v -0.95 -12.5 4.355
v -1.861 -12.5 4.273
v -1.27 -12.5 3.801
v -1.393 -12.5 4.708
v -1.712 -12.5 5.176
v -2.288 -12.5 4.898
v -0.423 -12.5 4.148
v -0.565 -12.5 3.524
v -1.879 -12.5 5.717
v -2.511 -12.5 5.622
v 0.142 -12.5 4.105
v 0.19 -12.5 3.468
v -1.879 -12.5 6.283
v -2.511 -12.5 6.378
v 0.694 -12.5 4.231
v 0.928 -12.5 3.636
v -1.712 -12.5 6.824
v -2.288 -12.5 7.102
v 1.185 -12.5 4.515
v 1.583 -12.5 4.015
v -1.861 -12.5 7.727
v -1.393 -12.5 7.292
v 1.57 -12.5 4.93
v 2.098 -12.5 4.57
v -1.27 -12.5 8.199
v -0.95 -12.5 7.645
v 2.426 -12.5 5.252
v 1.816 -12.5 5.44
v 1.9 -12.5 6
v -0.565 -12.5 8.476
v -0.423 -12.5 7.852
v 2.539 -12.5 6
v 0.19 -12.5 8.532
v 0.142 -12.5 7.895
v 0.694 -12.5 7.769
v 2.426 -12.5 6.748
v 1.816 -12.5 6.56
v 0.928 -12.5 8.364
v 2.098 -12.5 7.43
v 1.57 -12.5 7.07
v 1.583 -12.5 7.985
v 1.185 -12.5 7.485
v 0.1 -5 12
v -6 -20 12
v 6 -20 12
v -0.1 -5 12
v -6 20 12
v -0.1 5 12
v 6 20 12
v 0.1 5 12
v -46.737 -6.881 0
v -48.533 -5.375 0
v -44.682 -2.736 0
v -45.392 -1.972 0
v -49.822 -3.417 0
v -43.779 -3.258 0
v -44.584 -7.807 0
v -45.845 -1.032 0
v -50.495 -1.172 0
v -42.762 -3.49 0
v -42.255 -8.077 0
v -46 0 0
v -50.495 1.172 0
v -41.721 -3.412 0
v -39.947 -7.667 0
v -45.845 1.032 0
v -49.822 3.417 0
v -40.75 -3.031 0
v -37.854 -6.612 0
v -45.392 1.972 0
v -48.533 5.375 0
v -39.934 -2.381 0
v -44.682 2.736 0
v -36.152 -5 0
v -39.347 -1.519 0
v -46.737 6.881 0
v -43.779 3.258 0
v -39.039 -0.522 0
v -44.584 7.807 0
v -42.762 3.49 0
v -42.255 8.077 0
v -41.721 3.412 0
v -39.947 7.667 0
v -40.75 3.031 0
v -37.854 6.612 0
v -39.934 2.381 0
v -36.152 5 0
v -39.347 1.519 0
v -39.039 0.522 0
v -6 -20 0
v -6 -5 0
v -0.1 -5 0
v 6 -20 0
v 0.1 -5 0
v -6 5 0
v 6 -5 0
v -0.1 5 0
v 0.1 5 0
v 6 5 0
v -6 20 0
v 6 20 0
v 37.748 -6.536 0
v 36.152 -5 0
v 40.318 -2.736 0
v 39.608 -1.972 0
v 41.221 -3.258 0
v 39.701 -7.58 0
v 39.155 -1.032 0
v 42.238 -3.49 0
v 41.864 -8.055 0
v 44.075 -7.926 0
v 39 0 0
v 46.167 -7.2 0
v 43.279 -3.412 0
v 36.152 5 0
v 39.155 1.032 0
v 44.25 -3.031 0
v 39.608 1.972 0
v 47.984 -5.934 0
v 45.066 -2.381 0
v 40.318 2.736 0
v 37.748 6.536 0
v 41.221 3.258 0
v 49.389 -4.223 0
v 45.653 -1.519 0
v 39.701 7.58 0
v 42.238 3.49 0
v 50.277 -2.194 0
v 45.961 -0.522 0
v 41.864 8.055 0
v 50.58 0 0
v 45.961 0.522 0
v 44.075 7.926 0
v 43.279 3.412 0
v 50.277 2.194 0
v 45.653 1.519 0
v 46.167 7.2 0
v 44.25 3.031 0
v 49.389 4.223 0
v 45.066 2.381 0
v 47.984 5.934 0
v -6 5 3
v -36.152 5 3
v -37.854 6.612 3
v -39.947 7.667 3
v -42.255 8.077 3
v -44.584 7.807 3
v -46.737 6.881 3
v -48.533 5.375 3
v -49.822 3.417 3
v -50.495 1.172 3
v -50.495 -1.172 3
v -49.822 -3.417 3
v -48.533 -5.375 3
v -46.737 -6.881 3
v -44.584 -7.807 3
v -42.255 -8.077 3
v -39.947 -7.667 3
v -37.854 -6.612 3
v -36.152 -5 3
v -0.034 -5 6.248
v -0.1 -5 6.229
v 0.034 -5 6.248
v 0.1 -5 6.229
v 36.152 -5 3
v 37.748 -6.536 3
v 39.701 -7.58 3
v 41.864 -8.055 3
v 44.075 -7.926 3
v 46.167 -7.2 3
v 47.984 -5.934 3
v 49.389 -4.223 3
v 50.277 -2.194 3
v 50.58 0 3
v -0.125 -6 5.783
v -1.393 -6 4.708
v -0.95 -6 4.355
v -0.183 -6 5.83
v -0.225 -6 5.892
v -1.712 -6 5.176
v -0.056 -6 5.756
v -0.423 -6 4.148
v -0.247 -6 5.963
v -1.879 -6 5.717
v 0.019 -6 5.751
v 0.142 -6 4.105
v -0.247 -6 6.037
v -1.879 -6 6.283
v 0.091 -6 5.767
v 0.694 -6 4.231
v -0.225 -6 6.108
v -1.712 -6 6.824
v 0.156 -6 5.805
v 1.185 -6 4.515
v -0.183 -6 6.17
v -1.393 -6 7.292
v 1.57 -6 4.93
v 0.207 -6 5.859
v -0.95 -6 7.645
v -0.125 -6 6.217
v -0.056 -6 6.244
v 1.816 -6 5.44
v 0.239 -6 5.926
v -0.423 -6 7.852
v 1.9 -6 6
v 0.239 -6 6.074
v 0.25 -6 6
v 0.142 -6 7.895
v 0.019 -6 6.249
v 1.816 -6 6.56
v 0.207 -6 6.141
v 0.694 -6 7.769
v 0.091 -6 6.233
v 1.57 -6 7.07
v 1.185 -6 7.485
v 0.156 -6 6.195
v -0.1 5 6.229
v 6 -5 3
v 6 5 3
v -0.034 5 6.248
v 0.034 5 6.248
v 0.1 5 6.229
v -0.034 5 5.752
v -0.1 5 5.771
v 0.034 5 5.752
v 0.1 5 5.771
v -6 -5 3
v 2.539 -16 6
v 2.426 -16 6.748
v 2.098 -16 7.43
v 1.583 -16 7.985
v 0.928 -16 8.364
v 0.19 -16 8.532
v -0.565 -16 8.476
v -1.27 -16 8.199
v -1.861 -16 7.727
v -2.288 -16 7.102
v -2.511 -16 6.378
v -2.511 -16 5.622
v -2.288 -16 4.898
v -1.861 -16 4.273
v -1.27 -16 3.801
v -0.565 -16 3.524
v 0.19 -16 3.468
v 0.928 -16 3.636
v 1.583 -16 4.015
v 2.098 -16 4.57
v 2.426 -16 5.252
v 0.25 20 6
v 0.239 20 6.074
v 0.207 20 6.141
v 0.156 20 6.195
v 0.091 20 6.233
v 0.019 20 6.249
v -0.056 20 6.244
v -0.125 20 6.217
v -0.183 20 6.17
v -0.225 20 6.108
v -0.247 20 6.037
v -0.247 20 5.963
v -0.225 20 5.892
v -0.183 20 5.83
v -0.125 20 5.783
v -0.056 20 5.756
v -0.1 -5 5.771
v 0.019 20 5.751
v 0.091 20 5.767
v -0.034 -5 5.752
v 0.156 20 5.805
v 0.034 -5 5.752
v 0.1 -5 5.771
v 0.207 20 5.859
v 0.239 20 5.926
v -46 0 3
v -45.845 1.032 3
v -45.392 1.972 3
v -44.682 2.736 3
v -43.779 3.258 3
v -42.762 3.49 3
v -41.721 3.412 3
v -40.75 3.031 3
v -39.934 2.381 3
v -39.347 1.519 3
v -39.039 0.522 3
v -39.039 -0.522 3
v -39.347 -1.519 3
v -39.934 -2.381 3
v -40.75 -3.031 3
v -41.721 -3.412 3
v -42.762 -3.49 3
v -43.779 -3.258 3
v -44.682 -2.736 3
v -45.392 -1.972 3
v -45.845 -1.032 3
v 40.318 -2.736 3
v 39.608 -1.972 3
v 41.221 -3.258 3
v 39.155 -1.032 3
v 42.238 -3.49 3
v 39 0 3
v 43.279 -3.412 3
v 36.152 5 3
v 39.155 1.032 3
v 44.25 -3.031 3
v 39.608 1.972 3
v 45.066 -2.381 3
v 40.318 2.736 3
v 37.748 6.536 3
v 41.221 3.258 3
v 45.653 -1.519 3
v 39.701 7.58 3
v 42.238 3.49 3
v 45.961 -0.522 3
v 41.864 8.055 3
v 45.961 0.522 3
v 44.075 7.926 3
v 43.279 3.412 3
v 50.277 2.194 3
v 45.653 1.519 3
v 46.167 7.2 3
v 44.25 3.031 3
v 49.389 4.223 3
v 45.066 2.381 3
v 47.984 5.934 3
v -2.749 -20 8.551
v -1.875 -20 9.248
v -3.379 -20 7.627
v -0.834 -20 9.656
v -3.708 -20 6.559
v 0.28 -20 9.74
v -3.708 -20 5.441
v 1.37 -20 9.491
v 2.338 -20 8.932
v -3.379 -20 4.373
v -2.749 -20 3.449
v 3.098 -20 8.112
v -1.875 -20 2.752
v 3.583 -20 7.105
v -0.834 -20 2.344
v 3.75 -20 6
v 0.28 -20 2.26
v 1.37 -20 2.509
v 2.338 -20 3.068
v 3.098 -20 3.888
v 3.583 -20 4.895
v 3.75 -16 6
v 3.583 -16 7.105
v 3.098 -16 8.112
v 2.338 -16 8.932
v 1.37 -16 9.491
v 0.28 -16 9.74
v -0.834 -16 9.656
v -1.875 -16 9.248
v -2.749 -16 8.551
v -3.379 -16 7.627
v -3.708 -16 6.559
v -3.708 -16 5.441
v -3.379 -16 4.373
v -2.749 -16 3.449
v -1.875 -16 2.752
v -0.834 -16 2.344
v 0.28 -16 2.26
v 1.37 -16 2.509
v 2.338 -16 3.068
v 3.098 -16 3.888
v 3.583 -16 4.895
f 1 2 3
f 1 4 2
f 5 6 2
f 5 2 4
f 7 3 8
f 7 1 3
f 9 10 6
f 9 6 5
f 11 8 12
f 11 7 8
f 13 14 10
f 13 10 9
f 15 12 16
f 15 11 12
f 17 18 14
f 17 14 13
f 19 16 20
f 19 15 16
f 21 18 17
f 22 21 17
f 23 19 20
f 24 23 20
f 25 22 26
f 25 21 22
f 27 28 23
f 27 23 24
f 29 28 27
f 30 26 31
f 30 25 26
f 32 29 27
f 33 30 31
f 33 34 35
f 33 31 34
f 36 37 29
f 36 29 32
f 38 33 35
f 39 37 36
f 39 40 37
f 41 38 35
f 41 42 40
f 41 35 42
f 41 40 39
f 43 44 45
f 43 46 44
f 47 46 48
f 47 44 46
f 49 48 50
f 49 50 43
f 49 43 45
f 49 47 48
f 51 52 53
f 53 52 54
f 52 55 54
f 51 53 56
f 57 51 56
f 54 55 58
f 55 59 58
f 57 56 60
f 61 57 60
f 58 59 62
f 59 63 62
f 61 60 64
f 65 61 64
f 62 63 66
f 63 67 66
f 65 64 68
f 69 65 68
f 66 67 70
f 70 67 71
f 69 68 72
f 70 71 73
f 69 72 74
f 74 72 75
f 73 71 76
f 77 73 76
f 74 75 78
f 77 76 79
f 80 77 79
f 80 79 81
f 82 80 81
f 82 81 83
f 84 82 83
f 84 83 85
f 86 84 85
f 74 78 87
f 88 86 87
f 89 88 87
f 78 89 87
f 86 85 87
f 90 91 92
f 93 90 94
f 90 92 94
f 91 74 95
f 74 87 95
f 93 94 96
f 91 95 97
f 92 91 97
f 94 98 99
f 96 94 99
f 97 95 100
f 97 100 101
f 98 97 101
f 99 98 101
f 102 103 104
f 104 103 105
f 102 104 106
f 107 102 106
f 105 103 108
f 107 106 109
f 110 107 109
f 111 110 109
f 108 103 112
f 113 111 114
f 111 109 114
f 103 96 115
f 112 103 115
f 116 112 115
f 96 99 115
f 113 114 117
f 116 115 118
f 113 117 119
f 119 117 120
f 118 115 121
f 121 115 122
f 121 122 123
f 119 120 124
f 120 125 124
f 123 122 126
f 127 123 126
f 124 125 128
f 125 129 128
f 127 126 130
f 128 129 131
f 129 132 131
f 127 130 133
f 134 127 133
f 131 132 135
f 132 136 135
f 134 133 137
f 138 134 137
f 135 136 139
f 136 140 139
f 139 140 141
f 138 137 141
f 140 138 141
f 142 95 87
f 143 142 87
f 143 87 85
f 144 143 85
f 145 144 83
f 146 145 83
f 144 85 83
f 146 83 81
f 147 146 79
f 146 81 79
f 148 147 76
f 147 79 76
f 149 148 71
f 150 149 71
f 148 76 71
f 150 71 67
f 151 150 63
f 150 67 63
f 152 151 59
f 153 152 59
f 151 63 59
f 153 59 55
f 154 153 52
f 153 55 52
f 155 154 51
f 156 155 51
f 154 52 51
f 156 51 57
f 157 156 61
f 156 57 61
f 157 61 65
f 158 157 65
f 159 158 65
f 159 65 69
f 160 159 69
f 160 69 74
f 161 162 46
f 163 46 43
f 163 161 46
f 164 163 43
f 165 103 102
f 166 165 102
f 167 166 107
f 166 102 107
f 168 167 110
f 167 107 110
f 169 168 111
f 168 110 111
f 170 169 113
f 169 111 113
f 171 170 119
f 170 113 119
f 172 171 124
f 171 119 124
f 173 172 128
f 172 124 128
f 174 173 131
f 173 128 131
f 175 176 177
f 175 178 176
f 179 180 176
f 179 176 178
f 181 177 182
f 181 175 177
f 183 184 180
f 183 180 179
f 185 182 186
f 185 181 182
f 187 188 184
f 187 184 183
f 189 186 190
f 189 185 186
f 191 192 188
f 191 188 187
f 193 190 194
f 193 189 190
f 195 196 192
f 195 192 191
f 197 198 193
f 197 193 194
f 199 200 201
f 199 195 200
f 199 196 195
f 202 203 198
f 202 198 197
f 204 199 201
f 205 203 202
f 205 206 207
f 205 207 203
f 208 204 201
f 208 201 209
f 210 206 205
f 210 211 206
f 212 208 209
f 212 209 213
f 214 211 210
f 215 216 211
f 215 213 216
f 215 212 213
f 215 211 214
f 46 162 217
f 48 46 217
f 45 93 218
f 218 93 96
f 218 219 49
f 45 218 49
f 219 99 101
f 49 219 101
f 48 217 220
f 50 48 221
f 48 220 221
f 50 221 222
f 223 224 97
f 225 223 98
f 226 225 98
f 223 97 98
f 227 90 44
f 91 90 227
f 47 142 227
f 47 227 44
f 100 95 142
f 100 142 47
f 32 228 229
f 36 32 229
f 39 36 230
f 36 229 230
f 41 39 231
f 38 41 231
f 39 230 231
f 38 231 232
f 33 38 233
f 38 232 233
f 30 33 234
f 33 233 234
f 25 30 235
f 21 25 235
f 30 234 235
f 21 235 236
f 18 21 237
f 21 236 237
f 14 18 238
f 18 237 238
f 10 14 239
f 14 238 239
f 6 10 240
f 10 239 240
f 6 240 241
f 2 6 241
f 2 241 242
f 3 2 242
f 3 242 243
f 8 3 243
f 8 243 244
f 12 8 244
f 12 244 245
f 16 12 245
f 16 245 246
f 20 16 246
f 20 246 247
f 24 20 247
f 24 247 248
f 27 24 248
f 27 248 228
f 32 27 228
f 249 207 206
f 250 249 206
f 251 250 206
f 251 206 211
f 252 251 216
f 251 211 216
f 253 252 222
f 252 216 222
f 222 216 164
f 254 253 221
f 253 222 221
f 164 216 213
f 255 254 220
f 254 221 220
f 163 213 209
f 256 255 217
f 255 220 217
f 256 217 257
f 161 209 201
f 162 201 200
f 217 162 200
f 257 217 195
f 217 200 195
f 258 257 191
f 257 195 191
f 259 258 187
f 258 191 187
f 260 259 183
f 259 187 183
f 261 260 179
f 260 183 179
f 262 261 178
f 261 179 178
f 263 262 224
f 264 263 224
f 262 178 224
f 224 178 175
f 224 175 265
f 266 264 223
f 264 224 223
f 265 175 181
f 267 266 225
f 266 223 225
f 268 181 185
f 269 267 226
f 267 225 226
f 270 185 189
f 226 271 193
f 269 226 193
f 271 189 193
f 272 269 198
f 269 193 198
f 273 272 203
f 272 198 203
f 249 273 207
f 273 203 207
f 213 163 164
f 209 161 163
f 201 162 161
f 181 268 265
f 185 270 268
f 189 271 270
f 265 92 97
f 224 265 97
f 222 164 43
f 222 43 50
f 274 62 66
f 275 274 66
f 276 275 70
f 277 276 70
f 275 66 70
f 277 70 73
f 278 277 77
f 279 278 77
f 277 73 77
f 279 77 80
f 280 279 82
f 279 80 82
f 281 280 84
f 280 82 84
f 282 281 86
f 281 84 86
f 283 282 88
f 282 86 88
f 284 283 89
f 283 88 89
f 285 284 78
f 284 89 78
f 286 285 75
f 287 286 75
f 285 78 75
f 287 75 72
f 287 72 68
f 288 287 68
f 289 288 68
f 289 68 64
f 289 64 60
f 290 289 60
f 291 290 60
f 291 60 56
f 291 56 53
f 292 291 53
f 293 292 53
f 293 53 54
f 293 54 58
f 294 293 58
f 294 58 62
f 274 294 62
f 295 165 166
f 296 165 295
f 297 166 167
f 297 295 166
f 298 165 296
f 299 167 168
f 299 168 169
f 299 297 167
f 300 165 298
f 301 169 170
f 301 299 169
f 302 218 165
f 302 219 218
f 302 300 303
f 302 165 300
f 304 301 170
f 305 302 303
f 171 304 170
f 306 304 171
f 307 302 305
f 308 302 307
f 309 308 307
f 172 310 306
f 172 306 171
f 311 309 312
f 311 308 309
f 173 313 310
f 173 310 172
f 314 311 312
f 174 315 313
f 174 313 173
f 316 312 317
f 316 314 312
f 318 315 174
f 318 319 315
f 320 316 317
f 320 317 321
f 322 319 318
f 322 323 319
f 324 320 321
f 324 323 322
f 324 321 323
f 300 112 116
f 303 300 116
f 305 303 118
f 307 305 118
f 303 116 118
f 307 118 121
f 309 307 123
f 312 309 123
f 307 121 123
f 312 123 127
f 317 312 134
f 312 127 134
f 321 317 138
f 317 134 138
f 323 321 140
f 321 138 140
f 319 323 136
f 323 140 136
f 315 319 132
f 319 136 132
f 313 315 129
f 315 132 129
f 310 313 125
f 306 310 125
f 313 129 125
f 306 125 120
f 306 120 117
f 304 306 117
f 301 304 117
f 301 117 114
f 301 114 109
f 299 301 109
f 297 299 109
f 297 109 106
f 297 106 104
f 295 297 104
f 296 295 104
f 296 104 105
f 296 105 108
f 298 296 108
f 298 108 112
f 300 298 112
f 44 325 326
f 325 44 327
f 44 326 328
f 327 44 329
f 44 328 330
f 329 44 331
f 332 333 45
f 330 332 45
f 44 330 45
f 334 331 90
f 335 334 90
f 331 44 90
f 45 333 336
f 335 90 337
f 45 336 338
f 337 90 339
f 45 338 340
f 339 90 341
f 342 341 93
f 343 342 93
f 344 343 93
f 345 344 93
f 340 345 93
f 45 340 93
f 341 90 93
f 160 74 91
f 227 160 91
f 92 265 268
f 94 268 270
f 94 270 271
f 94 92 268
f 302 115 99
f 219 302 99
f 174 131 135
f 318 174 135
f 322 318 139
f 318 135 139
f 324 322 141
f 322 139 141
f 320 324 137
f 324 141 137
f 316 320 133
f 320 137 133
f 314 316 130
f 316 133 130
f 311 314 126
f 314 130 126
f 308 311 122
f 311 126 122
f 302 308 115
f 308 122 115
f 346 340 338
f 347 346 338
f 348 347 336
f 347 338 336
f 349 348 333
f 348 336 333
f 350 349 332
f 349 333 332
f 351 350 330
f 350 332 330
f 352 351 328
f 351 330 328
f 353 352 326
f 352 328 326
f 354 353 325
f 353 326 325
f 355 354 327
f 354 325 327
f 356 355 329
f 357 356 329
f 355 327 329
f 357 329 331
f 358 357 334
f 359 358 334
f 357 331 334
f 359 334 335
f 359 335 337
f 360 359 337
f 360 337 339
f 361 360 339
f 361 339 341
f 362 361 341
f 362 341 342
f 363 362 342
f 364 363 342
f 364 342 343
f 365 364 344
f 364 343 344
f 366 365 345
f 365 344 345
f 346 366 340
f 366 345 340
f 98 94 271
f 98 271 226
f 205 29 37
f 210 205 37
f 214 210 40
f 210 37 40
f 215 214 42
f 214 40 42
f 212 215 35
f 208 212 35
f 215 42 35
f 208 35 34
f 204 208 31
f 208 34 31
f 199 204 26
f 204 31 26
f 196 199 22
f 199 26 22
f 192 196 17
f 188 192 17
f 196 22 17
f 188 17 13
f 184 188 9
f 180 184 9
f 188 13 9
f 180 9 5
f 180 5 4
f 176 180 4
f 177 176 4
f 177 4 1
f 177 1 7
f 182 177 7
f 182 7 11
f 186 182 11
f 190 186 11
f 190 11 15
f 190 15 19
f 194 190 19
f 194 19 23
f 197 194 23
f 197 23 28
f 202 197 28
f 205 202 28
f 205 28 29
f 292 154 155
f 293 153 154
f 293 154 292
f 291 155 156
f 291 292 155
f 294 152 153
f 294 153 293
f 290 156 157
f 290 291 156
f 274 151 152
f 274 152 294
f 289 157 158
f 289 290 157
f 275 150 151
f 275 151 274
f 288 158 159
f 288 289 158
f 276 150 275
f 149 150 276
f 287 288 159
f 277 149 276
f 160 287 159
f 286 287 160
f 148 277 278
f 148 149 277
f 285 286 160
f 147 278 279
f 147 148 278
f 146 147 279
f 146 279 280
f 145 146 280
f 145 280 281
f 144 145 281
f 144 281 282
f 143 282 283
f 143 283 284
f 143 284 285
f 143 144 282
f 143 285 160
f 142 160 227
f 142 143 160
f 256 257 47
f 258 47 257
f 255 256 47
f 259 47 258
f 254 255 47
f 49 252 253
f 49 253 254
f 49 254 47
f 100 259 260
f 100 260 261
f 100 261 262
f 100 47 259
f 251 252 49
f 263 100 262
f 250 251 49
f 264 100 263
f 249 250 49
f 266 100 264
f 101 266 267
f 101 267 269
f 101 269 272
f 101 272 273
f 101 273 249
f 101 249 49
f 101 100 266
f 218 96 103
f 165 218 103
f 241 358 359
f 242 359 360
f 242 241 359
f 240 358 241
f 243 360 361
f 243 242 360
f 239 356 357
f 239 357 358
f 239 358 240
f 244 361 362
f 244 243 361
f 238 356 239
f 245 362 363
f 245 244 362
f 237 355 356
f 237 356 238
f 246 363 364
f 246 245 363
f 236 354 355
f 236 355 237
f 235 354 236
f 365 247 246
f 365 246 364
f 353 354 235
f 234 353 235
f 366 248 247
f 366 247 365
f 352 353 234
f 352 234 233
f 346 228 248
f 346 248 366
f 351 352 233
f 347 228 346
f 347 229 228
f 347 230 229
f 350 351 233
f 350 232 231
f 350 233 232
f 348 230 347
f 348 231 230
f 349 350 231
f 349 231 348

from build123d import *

# Parameters (mm, degrees)
F1_DEPTH  = 3
F3_D      = 7
F4_R      = 0.2
F5_DEPTH  = 12.5
F6_W      = 12
F6_H      = 40
F7_DEPTH  = 12
F8_W      = 0.2
F8_H      = 10
F9_DEPTH  = 12
F10_R     = 0.25
F11_DEPTH = 25
F12_R     = 1.9
F13_DEPTH = 14
F14_R     = 2.5392284098
F15_DEPTH = 7.5
F16_R     = 3.75
F17_DEPTH = 4


with BuildPart() as f1:
    # F0 (on Top) → F1 (new body)
    with BuildSketch(Plane.XY):
        with BuildLine():
            Line((42.5, 5), (42.5, -5))
            Line((42.5, -5), (36.1522351233, -5))
            ThreePointArc((36.1522351233, -5), (45.1458596679, -7.635020992), (50.5804776424, 0))
            ThreePointArc((50.5804776424, 0), (45.1458596679, 7.635020992), (36.1522351233, 5))
            Line((36.1522351233, 5), (42.5, 5))
        make_face()
        with BuildLine():
            ThreePointArc((-36.1522351233, 5), (-50.5804776424, 0), (-36.1522351233, -5))
            Line((-36.1522351233, -5), (-42.5, -5))
            Line((-42.5, -5), (-42.5, 5))
            Line((-42.5, 5), (-36.1522351233, 5))
        make_face()
        with BuildLine():
            Line((36.1522351233, -5), (42.5, -5))
            Line((42.5, -5), (42.5, 5))
            Line((42.5, 5), (36.1522351233, 5))
            ThreePointArc((36.1522351233, 5), (34.4195223576, 0), (36.1522351233, -5))
        make_face()
        with BuildLine():
            Line((-36.1522351233, -5), (36.1522351233, -5))
            ThreePointArc((36.1522351233, -5), (34.4195223576, 0), (36.1522351233, 5))
            Line((36.1522351233, 5), (-36.1522351233, 5))
            ThreePointArc((-36.1522351233, 5), (-34.864979008, 2.6458596679), (-34.4195223576, 0))
            ThreePointArc((-34.4195223576, 0), (-34.864979008, -2.6458596679), (-36.1522351233, -5))
        make_face()
        with BuildLine():
            Line((-42.5, -5), (-36.1522351233, -5))
            ThreePointArc((-36.1522351233, -5), (-34.864979008, -2.6458596679), (-34.4195223576, 0))
            ThreePointArc((-34.4195223576, 0), (-34.864979008, 2.6458596679), (-36.1522351233, 5))
            Line((-36.1522351233, 5), (-42.5, 5))
            Line((-42.5, 5), (-42.5, -5))
        make_face()
    extrude(amount=F1_DEPTH)

    # F3 (through all)
    with Locations(Plane.XY.offset(3)):
        with Locations((-42.5, 0), (42.5, 0)):
            Hole(F3_D / 2)

    # F4 (on Front) → F5 (cut, symmetric)
    with BuildSketch(Plane.XZ):
        with Locations((0, 21.0996698588)):
            Circle(F4_R)
    extrude(amount=F5_DEPTH, both=True, mode=Mode.SUBTRACT)

    # F6 (on Top) → F7 (join)
    with BuildSketch(Plane.XY):
        Rectangle(F6_W, F6_H)
    extrude(amount=F7_DEPTH)

    # F8 (on Top) → F9 (cut)
    with BuildSketch(Plane.XY):
        Rectangle(F8_W, F8_H)
    extrude(amount=F9_DEPTH, mode=Mode.SUBTRACT)

    # F10 (on Front) → F11 (cut, symmetric)
    with BuildSketch(Plane.XZ):
        with Locations((0, 6)):
            Circle(F10_R)
    extrude(amount=F11_DEPTH, both=True, mode=Mode.SUBTRACT)

    # F12 (on face) → F13 (cut)
    with BuildSketch(Plane.XZ.offset(20)):
        with Locations((0, 6)):
            Circle(F12_R)
    extrude(amount=-F13_DEPTH, mode=Mode.SUBTRACT)

    # F14 (on face) → F15 (cut)
    with BuildSketch(Plane.XZ.offset(20)):
        with Locations((0, 6)):
            Circle(F14_R)
    extrude(amount=-F15_DEPTH, mode=Mode.SUBTRACT)

    # F16 (on face) → F17 (cut)
    with BuildSketch(Plane.XZ.offset(20)):
        with Locations((0, 6)):
            Circle(F16_R)
    extrude(amount=-F17_DEPTH, mode=Mode.SUBTRACT)


solid = f1.part
